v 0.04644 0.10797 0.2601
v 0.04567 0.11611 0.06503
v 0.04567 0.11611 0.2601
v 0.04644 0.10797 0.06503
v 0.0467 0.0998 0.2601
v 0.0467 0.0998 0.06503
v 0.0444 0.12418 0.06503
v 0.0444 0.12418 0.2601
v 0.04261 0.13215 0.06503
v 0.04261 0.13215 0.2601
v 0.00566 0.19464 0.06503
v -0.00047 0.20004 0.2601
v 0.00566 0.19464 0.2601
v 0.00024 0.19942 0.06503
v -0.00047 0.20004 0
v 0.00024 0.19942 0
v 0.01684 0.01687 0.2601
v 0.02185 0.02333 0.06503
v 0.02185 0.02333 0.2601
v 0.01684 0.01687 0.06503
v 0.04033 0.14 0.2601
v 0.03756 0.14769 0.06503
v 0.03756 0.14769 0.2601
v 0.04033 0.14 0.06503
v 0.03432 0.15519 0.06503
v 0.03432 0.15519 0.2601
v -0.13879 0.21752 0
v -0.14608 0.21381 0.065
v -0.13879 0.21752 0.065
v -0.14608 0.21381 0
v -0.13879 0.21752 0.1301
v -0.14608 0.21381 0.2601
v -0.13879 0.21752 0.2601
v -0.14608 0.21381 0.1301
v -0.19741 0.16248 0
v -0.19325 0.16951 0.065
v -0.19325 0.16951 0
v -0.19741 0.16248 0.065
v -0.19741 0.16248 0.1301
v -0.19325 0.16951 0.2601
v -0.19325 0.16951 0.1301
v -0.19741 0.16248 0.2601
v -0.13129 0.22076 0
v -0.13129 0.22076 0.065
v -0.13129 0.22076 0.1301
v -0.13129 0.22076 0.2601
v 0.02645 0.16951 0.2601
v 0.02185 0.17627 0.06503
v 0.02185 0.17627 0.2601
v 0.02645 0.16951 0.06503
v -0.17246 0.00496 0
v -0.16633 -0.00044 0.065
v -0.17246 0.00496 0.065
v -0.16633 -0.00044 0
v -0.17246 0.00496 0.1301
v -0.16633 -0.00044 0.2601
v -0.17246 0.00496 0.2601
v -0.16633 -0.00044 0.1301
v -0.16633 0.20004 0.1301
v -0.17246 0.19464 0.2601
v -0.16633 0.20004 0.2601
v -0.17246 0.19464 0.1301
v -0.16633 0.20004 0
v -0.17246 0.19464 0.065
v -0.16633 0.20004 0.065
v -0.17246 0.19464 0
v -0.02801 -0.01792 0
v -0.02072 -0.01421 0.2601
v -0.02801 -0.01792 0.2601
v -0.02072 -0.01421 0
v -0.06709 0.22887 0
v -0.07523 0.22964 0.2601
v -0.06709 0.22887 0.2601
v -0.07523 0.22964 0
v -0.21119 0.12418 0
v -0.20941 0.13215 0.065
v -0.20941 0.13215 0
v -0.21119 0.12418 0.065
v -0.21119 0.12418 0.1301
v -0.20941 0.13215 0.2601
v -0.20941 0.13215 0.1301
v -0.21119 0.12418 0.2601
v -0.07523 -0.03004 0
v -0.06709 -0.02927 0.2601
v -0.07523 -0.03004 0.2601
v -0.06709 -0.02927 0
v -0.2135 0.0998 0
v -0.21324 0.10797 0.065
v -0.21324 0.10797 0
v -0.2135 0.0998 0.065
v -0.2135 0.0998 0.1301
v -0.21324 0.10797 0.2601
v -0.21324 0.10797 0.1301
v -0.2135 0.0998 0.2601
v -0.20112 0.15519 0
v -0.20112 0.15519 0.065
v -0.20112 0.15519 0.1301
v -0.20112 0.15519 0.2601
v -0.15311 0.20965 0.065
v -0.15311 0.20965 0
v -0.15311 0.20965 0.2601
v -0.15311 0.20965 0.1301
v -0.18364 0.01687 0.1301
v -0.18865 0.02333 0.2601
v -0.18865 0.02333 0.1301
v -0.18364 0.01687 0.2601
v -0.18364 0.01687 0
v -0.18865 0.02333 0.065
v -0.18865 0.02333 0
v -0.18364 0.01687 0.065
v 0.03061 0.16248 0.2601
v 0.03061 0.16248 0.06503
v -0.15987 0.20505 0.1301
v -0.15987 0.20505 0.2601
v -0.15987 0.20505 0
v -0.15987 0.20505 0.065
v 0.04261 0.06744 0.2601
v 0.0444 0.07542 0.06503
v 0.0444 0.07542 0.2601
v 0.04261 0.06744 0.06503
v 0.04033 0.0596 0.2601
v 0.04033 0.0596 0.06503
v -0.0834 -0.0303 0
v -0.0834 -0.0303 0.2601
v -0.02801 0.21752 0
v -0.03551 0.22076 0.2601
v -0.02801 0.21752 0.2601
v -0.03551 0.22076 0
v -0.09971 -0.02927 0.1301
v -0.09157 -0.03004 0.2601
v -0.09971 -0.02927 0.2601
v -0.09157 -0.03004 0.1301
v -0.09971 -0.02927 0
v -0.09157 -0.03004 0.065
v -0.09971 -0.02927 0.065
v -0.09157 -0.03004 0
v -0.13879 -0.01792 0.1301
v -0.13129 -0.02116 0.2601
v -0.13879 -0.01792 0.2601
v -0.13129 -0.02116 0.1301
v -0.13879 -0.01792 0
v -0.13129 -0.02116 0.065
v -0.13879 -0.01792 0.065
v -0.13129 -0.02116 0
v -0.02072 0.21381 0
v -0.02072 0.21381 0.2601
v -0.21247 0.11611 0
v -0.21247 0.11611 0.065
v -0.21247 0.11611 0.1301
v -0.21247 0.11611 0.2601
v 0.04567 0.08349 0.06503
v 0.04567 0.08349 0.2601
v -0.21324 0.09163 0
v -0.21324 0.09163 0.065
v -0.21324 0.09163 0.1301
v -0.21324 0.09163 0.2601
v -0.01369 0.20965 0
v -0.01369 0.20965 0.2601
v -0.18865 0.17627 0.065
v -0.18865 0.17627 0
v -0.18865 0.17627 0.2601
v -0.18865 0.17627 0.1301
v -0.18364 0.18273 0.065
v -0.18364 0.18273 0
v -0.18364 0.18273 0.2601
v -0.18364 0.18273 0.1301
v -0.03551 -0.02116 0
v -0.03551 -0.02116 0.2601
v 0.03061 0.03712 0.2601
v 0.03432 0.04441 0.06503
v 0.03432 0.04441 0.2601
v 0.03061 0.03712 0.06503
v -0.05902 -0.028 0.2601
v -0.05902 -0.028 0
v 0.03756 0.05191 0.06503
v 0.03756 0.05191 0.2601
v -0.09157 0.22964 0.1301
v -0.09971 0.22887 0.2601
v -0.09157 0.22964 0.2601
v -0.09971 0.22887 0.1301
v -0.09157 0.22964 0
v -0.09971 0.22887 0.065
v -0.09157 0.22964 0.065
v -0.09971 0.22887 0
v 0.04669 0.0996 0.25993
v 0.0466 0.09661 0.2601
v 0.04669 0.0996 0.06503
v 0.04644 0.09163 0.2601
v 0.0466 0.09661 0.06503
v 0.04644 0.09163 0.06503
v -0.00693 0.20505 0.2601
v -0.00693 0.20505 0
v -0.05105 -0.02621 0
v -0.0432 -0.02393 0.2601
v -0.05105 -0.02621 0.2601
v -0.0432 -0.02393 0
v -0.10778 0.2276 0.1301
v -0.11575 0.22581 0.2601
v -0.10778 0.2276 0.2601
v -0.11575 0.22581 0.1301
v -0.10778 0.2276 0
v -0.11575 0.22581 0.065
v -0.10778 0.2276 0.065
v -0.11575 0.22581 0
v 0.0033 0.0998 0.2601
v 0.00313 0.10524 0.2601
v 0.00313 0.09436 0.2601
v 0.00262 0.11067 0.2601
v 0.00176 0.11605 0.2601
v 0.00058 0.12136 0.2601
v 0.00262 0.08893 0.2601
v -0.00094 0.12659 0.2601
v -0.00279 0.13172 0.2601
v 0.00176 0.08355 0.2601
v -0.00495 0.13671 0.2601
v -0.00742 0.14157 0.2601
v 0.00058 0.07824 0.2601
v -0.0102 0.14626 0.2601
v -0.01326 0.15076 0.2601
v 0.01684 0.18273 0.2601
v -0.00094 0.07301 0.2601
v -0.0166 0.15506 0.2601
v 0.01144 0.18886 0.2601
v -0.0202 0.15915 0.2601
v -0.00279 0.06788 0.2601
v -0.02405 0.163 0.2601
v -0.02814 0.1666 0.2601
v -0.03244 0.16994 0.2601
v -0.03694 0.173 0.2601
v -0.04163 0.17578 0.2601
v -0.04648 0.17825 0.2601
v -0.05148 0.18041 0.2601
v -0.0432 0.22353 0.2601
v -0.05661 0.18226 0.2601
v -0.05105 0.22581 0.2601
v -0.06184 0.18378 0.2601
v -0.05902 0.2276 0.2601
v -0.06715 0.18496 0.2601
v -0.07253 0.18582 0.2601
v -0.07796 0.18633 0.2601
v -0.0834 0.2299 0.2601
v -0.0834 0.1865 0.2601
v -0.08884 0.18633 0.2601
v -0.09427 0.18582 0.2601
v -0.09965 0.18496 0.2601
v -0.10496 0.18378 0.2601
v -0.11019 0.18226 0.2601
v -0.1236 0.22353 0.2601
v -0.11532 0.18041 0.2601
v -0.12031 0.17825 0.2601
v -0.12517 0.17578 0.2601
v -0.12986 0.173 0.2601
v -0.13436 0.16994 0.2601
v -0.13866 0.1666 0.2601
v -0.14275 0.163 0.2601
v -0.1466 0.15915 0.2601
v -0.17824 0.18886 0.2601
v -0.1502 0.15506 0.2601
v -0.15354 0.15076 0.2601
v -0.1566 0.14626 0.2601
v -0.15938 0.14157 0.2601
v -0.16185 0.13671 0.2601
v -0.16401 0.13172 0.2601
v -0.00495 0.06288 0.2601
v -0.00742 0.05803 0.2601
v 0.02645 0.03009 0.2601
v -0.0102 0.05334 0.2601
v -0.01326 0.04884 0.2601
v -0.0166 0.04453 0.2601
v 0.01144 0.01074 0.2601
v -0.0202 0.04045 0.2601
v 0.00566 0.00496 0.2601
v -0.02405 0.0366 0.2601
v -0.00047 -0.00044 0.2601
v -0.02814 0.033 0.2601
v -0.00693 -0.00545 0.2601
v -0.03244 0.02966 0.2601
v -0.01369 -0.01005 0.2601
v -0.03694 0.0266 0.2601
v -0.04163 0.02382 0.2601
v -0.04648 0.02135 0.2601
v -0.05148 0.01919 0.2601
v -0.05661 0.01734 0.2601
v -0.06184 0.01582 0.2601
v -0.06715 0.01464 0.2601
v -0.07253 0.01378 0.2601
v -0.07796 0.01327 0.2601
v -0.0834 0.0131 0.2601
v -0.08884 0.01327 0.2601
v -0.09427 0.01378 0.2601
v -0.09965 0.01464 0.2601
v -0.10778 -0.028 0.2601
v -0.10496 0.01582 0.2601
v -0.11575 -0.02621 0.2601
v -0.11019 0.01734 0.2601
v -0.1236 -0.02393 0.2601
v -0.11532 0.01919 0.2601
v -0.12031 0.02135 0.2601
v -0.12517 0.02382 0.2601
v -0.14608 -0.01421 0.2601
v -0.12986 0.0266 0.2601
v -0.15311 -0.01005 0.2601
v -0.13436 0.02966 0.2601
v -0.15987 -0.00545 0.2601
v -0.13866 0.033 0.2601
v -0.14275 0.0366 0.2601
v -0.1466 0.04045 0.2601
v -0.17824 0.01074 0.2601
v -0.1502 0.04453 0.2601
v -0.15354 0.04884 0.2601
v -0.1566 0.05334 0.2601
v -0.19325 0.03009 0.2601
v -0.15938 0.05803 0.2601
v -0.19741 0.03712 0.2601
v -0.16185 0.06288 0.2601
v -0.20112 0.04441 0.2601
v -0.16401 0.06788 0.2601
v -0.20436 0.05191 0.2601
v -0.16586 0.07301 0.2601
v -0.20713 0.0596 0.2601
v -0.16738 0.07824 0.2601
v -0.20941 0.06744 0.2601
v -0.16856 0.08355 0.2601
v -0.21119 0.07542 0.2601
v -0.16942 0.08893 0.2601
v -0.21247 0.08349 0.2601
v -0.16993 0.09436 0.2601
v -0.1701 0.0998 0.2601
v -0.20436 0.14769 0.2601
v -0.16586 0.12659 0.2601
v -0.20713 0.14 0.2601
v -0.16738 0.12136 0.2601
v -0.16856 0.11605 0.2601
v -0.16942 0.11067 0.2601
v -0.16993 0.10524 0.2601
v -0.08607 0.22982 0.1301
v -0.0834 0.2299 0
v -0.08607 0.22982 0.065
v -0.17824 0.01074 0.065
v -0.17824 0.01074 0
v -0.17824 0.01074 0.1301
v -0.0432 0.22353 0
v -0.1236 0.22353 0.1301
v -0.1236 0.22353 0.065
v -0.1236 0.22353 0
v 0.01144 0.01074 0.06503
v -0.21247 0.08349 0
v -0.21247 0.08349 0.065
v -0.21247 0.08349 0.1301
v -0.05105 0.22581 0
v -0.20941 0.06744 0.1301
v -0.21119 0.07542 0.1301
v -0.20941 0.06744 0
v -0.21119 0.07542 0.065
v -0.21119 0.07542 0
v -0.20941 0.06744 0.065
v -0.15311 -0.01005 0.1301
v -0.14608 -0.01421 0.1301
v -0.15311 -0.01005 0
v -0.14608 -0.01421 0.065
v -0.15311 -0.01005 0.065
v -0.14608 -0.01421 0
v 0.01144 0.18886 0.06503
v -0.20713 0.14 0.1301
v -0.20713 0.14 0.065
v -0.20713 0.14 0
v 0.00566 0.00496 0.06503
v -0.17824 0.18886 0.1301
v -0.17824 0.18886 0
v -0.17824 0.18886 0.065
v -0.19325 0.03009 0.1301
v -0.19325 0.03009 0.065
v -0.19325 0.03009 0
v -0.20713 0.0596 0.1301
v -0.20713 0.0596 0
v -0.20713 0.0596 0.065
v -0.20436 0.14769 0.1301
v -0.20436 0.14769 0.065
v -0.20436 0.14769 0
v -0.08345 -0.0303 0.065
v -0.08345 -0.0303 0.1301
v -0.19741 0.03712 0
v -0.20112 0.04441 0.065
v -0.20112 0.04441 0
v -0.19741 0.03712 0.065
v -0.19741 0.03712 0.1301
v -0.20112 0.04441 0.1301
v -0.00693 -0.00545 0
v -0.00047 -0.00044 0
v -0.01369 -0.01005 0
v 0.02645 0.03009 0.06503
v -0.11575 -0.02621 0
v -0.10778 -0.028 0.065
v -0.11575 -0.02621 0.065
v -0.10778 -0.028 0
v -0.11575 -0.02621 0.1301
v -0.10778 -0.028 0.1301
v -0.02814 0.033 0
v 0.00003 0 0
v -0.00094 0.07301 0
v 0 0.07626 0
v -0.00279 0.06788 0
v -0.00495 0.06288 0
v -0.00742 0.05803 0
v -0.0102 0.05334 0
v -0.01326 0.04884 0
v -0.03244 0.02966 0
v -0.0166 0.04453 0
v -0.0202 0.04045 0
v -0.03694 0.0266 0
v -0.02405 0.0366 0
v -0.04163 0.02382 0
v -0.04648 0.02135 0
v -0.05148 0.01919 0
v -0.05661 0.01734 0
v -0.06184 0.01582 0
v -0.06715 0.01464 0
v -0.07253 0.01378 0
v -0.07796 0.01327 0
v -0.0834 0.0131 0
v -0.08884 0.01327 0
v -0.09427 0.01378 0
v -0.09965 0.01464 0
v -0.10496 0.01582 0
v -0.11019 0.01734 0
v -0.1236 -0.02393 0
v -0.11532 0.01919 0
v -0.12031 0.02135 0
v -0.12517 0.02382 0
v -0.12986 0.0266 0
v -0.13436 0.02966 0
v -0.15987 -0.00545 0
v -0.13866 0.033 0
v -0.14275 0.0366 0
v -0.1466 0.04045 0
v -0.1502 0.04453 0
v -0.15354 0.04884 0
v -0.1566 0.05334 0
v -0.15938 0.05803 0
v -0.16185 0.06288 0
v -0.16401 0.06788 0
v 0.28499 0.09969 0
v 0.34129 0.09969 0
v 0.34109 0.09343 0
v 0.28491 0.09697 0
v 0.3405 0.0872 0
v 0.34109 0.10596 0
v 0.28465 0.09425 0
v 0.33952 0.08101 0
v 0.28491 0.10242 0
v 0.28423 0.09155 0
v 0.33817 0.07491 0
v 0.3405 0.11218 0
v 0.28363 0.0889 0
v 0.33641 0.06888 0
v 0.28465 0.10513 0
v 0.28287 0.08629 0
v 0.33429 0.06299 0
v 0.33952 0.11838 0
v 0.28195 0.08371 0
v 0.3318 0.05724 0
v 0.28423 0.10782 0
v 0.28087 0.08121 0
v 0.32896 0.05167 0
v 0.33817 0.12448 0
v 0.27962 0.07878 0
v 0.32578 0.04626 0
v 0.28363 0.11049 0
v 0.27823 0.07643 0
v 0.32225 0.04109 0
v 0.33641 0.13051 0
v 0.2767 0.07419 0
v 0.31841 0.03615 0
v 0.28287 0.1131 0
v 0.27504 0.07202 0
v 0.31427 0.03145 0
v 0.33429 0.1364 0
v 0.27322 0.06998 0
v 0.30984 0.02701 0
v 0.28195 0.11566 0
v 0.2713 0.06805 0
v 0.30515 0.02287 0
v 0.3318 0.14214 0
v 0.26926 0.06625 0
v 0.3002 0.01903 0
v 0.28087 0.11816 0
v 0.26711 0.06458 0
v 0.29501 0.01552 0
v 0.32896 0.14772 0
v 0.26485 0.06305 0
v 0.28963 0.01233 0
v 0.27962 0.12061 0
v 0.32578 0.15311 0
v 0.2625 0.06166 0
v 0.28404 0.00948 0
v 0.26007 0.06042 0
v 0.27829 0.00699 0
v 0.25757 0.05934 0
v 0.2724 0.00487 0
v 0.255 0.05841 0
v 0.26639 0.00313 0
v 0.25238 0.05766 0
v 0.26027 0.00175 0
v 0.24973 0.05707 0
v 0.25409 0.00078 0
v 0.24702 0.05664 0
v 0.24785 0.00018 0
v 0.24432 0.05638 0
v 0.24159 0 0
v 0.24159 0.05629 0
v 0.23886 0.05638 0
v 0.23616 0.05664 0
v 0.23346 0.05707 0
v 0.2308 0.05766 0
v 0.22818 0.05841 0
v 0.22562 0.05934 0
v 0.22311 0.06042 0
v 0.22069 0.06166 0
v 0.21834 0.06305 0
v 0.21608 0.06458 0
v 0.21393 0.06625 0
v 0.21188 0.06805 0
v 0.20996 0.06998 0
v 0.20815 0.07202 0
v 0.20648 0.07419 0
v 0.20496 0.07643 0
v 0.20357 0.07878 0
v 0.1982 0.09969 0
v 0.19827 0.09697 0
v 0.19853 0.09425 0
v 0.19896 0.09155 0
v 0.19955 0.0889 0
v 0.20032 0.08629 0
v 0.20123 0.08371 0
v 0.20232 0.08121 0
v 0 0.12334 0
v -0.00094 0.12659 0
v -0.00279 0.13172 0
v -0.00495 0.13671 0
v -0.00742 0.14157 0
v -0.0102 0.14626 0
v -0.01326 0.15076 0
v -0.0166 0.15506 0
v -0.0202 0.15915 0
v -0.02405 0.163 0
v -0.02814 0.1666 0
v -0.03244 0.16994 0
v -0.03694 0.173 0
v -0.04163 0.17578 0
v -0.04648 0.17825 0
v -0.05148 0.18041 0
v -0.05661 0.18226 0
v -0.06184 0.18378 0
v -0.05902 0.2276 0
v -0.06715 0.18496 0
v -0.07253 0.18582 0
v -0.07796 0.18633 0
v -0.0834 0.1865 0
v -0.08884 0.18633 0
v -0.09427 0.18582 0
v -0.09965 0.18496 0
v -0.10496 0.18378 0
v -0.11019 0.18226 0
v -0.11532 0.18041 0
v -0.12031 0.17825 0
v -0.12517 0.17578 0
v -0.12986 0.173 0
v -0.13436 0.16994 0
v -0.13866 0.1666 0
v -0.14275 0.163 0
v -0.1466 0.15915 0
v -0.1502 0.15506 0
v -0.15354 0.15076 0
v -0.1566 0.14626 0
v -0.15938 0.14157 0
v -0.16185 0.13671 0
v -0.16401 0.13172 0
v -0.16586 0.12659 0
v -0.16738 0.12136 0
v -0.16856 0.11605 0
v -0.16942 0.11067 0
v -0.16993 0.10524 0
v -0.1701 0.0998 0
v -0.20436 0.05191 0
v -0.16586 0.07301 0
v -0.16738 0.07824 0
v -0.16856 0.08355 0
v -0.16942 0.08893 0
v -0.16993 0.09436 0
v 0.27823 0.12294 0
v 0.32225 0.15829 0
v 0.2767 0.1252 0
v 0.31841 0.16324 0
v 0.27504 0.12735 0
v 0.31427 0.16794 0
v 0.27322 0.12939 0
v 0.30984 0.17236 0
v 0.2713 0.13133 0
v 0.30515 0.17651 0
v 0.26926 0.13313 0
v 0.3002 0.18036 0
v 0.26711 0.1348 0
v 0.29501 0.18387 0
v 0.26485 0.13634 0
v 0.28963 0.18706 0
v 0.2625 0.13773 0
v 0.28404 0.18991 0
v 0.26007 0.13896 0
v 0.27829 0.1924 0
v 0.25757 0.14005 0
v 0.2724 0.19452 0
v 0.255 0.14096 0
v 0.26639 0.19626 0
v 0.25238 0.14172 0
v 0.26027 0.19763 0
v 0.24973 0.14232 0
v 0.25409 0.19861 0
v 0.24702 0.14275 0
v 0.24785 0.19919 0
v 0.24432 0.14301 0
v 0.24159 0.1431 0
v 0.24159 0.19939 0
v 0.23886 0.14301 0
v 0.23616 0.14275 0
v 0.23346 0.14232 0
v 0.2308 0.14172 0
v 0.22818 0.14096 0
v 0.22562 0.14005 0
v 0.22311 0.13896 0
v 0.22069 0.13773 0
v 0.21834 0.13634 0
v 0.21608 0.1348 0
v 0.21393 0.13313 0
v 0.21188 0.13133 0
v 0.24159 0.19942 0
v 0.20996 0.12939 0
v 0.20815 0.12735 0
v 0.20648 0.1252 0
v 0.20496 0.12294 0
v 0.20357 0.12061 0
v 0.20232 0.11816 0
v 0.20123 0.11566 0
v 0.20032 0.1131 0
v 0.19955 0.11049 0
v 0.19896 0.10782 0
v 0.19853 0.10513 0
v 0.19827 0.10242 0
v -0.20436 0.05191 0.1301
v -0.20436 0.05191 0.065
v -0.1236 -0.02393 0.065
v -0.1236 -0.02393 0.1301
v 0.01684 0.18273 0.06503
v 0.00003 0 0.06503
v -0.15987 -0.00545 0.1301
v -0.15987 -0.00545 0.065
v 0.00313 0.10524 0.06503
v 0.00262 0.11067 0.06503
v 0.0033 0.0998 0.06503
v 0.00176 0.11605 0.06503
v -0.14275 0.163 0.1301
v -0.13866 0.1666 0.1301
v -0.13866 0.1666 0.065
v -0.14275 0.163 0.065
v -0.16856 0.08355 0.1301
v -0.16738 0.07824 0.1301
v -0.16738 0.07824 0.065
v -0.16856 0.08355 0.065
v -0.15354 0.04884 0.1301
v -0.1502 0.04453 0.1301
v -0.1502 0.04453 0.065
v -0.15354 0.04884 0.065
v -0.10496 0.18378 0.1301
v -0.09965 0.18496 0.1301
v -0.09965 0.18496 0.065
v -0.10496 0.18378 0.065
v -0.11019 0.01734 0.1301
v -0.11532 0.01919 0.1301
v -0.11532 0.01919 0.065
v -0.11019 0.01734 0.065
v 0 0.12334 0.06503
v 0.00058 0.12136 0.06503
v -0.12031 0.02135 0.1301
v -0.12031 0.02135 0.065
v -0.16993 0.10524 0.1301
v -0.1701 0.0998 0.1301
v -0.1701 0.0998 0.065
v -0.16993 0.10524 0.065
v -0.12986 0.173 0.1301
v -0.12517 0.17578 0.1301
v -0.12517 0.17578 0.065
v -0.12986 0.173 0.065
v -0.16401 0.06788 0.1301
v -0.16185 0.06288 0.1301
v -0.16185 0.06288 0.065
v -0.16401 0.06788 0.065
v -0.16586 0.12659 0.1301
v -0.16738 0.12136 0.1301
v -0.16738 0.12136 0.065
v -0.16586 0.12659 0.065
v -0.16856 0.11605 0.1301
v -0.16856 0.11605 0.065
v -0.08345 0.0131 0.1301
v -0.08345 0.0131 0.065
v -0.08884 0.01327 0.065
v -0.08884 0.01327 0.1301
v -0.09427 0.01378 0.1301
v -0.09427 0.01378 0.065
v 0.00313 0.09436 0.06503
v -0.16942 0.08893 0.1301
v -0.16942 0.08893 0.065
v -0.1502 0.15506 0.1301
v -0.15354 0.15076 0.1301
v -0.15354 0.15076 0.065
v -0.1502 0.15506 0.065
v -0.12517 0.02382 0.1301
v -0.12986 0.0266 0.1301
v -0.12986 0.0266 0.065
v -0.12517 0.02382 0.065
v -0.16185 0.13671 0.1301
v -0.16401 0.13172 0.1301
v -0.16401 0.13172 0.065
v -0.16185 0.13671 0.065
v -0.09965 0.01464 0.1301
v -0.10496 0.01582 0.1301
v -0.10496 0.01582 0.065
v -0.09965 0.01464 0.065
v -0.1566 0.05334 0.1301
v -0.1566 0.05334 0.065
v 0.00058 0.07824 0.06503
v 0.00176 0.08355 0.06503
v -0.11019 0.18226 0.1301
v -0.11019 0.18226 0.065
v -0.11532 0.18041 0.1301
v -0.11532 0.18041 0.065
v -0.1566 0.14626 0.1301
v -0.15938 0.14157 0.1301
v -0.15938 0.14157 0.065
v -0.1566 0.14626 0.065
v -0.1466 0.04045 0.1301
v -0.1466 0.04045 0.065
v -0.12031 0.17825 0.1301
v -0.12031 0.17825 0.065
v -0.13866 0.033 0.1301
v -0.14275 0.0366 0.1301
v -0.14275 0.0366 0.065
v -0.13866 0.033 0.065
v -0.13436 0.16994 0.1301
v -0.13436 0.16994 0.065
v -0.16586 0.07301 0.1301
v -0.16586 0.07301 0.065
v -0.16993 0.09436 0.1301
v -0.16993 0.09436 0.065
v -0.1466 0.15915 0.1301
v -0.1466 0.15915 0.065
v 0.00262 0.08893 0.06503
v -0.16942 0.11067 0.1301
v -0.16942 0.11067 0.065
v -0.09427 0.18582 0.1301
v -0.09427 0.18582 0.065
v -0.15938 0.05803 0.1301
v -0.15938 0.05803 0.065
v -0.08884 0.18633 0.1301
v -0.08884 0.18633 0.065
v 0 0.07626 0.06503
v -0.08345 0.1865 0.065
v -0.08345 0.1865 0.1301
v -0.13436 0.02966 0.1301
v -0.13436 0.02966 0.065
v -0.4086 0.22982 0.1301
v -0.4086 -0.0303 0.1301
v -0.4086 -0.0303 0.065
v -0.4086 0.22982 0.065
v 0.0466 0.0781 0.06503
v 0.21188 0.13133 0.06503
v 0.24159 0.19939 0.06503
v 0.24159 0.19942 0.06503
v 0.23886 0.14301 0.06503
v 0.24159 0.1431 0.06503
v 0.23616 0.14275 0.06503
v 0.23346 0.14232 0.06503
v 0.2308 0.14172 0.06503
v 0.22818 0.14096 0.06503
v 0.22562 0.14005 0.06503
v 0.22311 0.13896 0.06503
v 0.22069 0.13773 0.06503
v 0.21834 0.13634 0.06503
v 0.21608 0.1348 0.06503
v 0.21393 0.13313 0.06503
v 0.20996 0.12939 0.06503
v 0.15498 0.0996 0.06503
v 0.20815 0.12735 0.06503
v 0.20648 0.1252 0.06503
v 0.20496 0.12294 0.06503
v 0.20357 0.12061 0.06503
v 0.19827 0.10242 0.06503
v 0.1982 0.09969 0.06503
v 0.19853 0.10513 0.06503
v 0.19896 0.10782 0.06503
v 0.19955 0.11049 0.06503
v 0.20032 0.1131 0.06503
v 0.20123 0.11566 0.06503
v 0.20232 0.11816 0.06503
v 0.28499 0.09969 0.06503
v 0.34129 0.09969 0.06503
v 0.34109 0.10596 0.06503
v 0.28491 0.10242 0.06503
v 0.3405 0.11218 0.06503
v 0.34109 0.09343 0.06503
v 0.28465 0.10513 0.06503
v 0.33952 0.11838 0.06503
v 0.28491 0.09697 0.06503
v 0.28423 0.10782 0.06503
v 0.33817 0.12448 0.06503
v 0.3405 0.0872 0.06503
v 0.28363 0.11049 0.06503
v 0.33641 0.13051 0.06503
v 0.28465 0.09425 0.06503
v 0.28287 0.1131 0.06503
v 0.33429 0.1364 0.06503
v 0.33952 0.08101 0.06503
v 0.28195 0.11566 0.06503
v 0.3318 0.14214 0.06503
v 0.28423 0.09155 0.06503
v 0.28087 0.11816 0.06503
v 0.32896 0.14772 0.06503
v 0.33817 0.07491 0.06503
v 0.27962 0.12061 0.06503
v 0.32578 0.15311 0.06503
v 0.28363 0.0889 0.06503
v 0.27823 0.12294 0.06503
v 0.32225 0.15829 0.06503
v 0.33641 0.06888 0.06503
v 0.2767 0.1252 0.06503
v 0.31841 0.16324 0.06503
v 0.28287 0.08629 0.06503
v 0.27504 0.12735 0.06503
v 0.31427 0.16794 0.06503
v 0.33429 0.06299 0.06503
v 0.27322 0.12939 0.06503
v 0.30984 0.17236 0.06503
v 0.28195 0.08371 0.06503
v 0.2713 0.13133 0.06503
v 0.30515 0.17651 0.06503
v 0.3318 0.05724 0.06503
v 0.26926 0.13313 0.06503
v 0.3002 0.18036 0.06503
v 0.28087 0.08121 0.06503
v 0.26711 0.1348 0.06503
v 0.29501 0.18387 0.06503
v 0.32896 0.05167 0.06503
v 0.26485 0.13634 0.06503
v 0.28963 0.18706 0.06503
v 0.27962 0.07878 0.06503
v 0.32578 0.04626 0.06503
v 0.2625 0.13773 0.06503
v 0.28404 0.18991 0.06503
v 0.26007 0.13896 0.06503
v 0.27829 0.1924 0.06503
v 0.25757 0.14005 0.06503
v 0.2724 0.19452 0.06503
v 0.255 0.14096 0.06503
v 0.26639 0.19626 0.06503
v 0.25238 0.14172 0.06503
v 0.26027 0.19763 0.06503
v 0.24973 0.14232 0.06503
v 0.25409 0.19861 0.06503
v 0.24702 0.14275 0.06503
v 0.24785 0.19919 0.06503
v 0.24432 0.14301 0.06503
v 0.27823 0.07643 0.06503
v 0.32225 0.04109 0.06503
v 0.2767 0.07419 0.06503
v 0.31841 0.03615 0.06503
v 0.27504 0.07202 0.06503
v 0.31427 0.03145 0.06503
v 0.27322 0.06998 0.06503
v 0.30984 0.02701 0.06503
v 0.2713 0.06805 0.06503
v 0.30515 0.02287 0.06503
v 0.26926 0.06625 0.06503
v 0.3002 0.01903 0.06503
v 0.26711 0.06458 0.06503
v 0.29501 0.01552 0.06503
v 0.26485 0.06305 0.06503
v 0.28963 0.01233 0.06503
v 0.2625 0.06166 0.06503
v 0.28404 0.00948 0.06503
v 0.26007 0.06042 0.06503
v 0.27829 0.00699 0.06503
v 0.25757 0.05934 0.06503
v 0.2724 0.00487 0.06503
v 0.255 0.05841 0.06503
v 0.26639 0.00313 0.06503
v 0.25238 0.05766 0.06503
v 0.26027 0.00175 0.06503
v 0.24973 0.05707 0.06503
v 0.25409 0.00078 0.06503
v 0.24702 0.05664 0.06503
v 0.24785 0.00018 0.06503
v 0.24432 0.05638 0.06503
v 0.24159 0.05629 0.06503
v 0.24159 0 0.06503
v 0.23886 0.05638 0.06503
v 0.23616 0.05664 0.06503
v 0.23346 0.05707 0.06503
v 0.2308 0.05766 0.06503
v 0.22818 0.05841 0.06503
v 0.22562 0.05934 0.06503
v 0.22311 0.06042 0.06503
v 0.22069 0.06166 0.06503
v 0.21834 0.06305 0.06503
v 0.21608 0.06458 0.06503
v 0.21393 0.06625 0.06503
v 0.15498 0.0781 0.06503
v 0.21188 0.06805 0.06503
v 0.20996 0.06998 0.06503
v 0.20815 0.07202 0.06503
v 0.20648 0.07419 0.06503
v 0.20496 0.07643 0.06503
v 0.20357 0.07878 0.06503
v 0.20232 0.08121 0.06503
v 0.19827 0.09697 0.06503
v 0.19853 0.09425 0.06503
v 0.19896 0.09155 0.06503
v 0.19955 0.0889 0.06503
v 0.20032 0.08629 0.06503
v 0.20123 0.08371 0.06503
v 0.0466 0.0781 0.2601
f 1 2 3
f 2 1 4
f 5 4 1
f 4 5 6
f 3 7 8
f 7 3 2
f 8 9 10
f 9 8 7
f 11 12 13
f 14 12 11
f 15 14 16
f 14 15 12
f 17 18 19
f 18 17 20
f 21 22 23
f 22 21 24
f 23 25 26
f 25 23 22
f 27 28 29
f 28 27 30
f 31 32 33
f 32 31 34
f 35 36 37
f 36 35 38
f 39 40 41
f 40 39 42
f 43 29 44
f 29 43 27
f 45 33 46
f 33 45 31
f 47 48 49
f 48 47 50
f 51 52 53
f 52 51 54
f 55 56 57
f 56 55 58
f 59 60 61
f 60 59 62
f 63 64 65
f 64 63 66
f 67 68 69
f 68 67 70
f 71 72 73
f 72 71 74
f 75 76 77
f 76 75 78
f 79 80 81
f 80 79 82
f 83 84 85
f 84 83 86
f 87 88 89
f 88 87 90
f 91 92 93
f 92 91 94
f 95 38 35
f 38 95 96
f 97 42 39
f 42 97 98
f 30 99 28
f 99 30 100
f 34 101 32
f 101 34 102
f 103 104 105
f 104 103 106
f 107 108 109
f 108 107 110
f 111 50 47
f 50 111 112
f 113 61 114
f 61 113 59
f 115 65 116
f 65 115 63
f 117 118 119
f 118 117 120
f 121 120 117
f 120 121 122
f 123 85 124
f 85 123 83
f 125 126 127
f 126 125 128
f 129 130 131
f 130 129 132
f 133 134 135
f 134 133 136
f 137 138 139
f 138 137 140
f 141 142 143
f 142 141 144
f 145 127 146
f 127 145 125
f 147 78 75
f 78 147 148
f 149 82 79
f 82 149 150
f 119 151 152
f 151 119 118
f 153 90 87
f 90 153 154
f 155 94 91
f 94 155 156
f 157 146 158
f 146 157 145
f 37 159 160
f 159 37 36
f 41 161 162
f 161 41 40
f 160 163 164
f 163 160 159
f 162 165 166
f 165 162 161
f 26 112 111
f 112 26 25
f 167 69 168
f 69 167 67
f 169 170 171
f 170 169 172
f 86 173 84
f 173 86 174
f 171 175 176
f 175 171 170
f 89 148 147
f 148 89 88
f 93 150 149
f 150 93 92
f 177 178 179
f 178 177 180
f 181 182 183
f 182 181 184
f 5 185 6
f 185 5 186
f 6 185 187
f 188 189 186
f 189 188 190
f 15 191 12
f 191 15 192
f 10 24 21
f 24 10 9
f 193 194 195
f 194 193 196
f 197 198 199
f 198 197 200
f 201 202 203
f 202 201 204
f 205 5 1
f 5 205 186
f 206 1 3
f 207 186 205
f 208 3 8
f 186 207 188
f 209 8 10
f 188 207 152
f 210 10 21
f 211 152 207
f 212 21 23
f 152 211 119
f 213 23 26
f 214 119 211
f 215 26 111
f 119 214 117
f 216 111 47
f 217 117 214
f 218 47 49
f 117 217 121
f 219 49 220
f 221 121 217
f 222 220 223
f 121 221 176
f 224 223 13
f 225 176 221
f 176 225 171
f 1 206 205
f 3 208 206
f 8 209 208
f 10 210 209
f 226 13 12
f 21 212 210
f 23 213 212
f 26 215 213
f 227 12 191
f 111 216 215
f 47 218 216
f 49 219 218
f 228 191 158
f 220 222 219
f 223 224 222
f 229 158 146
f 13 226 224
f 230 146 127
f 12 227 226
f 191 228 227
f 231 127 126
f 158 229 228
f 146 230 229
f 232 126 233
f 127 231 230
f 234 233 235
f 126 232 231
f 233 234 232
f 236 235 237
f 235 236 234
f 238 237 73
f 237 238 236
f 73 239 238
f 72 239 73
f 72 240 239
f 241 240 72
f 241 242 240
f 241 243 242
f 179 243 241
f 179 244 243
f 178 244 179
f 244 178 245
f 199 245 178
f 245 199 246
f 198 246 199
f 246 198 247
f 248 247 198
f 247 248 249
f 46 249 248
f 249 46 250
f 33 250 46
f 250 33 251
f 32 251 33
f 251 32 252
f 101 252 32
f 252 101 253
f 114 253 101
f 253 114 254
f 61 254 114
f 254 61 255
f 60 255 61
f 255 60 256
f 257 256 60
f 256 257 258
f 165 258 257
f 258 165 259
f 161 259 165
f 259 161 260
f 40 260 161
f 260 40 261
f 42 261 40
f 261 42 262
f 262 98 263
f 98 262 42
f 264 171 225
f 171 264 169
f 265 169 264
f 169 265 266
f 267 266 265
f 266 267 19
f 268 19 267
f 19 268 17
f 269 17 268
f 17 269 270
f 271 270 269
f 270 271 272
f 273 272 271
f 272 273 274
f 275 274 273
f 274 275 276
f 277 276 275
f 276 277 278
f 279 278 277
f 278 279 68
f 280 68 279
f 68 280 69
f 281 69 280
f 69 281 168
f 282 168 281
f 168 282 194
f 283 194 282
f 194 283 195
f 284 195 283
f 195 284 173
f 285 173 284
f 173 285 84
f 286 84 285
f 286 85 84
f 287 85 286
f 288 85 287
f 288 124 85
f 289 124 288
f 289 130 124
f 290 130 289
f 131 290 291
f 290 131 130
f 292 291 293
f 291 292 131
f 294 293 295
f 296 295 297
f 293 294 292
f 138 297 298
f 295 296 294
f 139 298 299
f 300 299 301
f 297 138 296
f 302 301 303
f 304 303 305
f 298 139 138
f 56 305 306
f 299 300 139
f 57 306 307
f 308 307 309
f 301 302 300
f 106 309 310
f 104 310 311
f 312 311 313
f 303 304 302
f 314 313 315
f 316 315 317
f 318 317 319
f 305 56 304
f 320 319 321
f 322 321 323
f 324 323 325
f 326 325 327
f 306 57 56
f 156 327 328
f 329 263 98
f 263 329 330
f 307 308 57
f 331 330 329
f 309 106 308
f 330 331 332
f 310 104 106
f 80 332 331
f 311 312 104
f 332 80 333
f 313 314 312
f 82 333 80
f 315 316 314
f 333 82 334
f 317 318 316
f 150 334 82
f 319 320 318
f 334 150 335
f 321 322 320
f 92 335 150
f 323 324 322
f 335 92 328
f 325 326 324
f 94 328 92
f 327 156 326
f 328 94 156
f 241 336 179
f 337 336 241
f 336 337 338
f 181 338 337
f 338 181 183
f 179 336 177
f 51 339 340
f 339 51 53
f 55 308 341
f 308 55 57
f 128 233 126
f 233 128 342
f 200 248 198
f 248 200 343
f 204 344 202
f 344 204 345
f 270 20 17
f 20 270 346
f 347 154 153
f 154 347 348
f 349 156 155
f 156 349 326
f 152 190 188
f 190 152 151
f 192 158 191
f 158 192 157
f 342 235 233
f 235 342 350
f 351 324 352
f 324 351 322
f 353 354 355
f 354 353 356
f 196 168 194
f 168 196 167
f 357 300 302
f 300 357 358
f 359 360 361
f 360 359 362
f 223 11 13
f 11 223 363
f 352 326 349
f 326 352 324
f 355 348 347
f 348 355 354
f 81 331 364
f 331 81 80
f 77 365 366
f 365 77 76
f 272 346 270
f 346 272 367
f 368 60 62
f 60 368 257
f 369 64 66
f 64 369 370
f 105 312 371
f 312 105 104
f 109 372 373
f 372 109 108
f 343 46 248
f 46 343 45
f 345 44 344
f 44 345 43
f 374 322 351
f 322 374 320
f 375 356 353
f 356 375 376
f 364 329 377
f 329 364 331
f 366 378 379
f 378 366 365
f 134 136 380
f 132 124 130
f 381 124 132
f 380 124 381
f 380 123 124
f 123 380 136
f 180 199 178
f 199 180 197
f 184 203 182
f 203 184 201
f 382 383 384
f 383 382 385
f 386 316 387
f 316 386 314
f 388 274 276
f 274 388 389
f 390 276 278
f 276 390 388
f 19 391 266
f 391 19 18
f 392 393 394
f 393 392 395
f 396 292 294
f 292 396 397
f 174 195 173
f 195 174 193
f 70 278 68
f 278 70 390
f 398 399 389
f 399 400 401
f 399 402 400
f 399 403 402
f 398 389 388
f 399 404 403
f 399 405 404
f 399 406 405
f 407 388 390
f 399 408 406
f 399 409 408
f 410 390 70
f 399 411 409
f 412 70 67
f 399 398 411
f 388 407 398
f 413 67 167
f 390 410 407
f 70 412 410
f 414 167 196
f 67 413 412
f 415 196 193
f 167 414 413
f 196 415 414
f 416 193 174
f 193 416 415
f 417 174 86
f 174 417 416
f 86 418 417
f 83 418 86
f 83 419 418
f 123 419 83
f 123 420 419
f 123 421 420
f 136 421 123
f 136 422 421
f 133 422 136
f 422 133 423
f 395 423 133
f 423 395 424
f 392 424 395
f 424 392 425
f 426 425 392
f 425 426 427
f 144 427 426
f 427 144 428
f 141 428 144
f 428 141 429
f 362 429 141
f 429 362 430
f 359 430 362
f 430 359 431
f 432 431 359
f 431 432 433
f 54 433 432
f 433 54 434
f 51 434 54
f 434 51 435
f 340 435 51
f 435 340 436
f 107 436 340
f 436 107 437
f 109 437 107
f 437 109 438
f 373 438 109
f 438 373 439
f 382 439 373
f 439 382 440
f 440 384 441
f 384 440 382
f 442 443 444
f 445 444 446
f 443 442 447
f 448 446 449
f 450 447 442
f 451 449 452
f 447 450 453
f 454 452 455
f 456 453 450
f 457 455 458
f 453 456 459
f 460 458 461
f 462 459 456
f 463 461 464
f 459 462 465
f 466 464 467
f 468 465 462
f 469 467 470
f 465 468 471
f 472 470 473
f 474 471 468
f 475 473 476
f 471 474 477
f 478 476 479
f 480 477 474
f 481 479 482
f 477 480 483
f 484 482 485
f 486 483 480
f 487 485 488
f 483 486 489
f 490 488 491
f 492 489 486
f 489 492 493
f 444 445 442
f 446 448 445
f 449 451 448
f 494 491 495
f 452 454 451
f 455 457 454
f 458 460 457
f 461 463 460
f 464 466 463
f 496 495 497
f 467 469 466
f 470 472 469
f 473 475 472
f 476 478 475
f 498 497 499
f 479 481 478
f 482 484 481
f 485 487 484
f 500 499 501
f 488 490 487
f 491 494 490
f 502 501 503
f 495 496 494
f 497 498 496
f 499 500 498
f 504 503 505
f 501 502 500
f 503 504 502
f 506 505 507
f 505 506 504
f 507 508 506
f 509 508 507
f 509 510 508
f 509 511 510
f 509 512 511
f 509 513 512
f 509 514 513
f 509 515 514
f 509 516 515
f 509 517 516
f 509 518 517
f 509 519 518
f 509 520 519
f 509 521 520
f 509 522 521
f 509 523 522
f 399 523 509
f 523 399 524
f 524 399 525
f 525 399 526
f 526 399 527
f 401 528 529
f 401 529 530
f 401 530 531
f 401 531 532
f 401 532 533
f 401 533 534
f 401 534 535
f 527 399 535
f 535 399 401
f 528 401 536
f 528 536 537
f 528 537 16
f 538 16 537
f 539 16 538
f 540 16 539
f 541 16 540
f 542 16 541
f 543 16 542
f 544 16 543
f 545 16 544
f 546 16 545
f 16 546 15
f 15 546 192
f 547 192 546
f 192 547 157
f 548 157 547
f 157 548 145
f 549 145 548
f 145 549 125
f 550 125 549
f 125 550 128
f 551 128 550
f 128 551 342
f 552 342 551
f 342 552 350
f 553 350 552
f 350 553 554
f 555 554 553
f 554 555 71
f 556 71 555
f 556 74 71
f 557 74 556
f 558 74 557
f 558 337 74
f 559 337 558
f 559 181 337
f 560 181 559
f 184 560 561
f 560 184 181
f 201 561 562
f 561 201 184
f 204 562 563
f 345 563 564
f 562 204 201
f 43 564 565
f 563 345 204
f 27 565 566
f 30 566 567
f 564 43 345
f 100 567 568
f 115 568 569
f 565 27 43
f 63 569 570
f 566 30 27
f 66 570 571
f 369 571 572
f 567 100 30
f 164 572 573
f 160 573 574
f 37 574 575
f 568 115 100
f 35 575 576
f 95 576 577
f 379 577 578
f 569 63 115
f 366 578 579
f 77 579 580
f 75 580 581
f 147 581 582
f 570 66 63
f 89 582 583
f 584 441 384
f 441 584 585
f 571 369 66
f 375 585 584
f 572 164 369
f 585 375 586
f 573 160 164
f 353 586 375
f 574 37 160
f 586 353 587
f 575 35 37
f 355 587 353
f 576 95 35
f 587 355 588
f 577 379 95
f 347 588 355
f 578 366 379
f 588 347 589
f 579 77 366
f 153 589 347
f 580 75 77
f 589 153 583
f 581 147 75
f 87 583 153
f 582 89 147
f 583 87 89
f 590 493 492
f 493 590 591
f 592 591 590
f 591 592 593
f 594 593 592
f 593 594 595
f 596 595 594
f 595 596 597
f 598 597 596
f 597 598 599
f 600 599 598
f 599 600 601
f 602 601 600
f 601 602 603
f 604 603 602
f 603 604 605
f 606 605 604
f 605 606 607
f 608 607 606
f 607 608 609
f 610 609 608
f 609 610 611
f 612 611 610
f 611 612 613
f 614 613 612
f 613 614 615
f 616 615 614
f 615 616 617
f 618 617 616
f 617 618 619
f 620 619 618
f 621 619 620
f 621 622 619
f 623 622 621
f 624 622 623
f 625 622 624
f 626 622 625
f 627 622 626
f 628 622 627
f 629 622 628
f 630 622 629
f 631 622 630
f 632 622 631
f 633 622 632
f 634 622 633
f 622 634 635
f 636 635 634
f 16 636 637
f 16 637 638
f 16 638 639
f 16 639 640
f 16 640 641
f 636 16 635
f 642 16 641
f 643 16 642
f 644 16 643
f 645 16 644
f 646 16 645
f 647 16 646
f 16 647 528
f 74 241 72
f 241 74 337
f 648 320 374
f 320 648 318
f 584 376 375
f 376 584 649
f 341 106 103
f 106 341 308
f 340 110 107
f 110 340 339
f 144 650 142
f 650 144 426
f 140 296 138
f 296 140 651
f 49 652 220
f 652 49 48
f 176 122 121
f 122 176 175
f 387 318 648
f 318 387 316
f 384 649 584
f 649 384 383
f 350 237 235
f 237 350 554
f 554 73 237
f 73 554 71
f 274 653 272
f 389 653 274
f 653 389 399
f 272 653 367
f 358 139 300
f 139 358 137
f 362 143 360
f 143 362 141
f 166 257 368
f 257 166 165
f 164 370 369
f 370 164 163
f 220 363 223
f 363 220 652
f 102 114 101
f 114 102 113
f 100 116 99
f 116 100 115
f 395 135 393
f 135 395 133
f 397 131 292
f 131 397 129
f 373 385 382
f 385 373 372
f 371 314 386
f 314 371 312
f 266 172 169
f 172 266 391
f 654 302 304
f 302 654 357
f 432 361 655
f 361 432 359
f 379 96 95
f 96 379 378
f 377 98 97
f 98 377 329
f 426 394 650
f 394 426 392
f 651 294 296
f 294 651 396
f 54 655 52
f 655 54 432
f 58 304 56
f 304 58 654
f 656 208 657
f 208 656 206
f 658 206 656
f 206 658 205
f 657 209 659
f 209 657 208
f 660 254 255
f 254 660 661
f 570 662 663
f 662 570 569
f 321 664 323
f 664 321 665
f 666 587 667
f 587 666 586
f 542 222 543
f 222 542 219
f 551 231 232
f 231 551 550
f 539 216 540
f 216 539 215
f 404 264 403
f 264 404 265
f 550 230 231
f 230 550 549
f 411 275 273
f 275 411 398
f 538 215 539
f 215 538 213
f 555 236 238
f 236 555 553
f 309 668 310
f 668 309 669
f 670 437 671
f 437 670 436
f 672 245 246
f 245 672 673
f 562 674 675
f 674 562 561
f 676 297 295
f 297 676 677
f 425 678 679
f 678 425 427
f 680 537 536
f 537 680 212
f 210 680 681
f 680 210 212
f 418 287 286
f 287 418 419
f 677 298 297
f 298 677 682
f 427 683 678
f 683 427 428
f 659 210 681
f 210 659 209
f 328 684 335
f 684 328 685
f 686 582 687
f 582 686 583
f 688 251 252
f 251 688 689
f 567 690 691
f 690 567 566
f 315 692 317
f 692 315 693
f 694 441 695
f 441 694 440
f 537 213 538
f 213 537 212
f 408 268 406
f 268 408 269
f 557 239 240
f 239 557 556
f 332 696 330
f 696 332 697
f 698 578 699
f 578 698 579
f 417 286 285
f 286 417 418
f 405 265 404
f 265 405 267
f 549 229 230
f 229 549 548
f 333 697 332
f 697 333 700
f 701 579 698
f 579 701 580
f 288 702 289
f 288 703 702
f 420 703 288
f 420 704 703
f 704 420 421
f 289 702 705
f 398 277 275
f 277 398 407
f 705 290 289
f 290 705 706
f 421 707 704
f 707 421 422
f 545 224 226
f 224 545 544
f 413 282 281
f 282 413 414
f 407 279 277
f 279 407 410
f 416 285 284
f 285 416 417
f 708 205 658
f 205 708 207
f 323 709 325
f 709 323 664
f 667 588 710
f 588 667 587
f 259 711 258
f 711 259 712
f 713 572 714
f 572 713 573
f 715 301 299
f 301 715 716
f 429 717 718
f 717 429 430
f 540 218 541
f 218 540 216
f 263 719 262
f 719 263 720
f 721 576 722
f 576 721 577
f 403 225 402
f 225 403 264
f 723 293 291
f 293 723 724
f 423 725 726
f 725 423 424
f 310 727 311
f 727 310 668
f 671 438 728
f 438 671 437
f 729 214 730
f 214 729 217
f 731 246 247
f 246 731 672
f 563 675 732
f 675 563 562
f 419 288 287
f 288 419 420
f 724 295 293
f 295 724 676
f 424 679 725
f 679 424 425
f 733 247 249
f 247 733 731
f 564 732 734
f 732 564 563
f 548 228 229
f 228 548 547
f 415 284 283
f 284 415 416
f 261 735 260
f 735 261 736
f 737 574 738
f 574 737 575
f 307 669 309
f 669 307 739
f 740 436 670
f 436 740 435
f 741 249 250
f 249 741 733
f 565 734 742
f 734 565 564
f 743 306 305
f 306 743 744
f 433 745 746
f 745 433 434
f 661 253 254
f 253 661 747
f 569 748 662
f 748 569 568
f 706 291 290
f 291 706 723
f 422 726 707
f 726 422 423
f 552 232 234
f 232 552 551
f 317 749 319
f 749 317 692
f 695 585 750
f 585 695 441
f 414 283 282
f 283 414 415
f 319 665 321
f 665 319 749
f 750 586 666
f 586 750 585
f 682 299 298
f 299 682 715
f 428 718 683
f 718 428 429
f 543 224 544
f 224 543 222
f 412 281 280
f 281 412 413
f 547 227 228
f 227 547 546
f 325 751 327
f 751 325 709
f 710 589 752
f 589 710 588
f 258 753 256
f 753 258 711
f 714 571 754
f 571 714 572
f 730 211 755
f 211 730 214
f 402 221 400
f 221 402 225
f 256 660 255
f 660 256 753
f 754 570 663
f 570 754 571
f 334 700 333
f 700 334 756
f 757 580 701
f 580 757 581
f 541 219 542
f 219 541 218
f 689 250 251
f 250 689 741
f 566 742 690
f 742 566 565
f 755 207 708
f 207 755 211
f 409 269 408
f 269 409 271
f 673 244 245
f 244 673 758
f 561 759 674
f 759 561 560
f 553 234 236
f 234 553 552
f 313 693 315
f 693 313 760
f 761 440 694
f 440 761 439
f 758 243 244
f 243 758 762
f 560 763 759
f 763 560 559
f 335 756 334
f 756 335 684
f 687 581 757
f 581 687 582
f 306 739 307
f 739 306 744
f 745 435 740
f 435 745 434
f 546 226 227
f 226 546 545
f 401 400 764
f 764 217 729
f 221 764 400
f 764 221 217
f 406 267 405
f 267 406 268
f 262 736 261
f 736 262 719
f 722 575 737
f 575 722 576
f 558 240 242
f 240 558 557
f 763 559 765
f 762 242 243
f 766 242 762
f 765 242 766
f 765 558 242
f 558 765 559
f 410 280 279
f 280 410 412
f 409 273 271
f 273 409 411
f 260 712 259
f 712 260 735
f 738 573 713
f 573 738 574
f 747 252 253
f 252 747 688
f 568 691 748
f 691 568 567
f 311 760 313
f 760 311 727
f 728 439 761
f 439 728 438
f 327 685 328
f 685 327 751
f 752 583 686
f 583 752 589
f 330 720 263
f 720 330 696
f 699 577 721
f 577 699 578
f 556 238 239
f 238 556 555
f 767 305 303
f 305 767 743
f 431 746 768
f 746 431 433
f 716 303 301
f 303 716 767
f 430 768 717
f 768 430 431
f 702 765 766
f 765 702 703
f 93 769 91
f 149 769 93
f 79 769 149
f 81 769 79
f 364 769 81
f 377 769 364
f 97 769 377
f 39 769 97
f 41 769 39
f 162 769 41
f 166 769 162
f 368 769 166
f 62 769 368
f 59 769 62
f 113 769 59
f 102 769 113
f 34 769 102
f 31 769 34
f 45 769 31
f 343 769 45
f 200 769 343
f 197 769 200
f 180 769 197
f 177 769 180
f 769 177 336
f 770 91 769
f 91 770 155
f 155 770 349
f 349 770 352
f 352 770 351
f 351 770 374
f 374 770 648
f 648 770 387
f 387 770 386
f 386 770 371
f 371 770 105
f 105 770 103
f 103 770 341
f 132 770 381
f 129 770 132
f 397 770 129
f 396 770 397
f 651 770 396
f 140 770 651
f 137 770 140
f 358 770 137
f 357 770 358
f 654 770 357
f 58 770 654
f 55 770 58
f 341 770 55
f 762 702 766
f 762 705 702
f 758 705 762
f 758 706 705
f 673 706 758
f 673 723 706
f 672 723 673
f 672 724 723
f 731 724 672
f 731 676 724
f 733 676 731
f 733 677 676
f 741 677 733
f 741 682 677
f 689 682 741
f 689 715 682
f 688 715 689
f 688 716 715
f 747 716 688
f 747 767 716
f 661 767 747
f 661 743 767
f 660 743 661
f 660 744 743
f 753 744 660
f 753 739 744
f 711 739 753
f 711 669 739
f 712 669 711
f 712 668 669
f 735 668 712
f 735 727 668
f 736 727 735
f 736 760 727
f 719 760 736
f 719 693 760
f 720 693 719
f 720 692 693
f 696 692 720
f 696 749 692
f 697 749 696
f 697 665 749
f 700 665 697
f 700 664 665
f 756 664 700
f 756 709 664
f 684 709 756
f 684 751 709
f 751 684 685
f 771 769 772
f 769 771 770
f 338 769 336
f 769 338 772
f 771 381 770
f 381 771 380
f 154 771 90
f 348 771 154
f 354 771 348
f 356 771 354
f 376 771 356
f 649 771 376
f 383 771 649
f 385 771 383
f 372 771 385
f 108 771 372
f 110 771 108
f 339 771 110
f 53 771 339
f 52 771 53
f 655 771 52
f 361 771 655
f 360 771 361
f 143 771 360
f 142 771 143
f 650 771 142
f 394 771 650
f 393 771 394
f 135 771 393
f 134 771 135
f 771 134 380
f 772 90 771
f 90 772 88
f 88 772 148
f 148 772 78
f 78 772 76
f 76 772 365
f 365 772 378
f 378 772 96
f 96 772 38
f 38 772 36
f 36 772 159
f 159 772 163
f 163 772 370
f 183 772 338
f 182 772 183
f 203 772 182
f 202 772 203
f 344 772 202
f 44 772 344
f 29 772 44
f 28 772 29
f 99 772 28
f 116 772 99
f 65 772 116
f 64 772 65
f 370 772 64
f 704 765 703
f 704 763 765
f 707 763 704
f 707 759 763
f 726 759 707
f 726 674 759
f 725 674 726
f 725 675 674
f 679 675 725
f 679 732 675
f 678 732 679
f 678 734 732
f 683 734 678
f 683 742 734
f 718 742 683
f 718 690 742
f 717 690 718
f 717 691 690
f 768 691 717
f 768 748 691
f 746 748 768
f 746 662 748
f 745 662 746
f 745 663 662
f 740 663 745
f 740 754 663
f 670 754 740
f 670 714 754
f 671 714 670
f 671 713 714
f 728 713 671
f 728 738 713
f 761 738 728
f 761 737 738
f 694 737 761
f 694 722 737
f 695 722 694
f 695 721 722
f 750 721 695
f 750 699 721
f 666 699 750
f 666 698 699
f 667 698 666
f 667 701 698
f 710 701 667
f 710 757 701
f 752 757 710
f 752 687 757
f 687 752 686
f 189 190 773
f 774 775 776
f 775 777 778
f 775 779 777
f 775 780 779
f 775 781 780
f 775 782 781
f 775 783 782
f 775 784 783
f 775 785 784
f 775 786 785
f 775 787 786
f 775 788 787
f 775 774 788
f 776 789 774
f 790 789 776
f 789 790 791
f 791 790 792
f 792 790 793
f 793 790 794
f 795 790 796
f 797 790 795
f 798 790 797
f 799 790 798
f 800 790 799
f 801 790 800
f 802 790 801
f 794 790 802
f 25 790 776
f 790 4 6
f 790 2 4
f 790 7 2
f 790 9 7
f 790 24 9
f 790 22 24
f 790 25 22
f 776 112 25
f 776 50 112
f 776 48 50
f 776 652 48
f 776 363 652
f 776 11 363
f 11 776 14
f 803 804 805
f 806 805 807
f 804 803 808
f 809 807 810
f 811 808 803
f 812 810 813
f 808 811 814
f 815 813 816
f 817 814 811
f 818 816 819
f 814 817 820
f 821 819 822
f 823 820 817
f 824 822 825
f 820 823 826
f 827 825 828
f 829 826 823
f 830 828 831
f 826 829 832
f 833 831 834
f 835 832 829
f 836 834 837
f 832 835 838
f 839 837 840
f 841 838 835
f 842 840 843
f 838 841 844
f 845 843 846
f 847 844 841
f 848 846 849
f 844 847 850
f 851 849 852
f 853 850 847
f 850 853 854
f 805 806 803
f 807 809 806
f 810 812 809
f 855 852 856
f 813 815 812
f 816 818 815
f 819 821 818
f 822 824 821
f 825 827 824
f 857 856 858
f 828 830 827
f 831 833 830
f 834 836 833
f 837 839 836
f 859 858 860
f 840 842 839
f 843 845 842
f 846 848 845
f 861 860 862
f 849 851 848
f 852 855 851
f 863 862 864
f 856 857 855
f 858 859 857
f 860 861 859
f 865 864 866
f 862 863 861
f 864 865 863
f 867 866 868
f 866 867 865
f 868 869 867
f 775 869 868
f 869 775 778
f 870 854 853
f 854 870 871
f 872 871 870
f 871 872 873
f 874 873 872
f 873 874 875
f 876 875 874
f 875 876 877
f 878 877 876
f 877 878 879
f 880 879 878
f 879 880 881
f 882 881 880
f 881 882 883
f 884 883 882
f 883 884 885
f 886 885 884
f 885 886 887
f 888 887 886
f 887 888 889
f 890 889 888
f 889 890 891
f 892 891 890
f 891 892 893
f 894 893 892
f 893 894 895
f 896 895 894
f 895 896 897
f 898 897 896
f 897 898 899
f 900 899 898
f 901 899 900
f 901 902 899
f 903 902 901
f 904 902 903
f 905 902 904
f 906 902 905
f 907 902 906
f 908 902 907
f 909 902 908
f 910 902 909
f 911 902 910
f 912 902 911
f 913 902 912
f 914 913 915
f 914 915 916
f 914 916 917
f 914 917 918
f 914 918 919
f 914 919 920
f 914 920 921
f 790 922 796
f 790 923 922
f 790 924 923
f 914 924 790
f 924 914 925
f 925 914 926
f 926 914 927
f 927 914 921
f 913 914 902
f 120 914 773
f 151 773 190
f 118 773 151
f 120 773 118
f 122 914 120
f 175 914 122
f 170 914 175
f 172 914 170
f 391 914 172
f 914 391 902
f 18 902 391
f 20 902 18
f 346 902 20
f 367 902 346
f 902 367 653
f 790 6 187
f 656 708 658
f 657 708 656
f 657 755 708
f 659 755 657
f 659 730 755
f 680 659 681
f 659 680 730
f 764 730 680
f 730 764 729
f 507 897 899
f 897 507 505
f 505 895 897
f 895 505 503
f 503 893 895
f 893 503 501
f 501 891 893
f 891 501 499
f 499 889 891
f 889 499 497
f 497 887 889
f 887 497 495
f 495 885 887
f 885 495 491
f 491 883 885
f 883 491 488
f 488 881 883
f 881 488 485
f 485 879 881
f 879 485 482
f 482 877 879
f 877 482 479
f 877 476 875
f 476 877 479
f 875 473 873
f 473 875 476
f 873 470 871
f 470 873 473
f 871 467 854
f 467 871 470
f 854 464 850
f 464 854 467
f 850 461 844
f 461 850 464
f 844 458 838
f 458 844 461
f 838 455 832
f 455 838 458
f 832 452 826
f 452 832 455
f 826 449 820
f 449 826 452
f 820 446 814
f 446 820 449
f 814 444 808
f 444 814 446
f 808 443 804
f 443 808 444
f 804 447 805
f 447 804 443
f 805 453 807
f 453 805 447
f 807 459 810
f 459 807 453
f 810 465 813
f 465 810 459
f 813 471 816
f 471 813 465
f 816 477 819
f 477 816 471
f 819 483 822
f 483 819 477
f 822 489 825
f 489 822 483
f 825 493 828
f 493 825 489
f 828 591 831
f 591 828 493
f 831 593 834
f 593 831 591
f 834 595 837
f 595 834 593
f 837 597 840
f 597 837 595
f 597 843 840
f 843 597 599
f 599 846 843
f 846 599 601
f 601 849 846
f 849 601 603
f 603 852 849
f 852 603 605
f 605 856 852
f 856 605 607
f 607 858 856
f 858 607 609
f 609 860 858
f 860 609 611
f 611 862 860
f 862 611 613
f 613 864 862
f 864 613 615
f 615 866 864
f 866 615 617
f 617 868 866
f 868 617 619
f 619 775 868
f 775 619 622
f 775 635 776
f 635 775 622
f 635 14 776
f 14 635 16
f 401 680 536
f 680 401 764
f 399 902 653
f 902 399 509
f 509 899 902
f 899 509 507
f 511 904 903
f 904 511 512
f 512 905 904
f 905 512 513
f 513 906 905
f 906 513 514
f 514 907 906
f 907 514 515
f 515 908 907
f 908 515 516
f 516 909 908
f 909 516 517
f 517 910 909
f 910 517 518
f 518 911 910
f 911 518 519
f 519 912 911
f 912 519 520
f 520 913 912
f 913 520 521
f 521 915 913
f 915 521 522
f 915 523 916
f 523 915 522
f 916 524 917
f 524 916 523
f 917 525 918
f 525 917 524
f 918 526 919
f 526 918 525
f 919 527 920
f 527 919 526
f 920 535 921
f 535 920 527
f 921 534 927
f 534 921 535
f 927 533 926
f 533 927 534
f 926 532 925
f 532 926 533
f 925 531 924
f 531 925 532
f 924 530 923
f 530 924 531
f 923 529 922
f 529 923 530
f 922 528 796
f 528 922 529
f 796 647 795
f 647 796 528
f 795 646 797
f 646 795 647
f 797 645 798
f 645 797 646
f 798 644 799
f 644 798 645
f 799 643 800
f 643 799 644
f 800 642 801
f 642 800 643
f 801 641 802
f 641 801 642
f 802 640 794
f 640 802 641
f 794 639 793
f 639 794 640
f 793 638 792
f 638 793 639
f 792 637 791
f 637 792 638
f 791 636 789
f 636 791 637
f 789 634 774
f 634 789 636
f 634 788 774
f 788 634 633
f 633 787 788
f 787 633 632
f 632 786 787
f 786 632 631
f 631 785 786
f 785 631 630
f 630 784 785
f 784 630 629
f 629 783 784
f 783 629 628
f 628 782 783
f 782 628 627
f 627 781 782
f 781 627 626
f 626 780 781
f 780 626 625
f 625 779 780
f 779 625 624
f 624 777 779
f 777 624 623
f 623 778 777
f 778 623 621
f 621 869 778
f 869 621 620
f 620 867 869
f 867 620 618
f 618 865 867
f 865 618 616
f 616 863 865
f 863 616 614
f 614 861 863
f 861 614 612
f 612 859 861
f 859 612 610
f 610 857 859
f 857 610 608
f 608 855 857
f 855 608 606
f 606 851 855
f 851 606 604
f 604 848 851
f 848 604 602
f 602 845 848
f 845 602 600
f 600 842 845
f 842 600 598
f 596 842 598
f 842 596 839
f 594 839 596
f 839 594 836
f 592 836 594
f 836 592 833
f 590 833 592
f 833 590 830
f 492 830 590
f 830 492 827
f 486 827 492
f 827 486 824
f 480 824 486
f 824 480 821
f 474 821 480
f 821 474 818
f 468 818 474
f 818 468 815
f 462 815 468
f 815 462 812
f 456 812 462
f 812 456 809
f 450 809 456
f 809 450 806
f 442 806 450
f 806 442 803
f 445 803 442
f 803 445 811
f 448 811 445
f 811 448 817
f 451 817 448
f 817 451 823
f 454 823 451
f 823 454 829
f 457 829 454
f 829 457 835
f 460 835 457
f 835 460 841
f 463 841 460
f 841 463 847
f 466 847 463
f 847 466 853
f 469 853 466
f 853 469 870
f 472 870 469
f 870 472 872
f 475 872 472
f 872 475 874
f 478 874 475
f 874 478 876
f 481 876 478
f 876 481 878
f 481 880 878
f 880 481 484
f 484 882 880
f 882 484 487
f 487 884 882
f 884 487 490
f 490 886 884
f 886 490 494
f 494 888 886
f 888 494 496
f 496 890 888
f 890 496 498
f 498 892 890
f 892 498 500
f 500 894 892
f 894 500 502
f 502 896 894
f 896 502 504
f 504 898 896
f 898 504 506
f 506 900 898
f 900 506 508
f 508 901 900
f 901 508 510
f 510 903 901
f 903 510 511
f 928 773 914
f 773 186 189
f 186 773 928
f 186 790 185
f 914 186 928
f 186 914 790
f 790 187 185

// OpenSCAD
// Global resolution setting for smooth curved surfaces
$fn = 100;

// --------------------------
// Parametric Model Definitions
// --------------------------
// Coordinate system: Origin at front-bottom-left corner of the main base
// X: Left-to-right, Y: Front-to-back, Z: Bottom-to-top (all dimensions in mm)

// Main base dimensions
base_length = 0.341352;    // Total X length of base
base_width = 0.199422;     // Total Y width of base
base_height = 0.065029;    // Total Z thickness of base
base_extrude = 0.065;      // Primary extrusion depth (matches base thickness)

// Low rounded annular section (integral to base right end)
annulus_cx = 0.2416;       // X center from left edge
annulus_cy = 0.0997;       // Y center from front edge
annulus_outer_r = 0.0997;  // Outer radius of annular ring
annulus_inner_r = 0.0434;  // Inner radius of through-hole

// Tall hollow overhanging sleeve
sleeve_cx = -0.0834;       // X center offset from base left edge
sleeve_cy = 0.0998;        // Y center offset from base front edge
sleeve_outer_r = 0.1301;   // Outer radius (matches 0.2602 span = 2*0.1301)
sleeve_inner_r = 0.0867;   // Inner radius for hollow bore
sleeve_height = 0.2601;    // Total height from base datum (Z=0 to Z=0.2601)

// Projecting straight-sided arm
arm_length = 0.325145;     // X dimension of arm
arm_width = 0.260116;      // Y dimension of arm
arm_total_height = 0.130058;// Full solid height before cut
arm_left_x = -0.4086;      // Left edge X (overhangs base left)
arm_front_y = -0.0303;     // Front edge Y (overhangs base front)
arm_cut_band_z = 0.065;    // Cut lower section from Z=0 to this height
arm_top_z = 0.1301;        // Final top surface height from base datum
// Calculated arm edges
arm_right_x = arm_left_x + arm_length;
arm_back_y = arm_front_y + arm_width;

// Triangular support gusset web
web_plan_run = 0.108382;   // Horizontal X run length from sleeve
web_thickness = 0.0217;    // Material thickness in Y direction
web_x_left = 0.0466;       // Left edge (adjacent to sleeve outer wall)
web_x_bound_right = 0.1863;// Right placement bound
web_y_front = 0.0781;      // Front edge Y
web_y_back = 0.0996;       // Back edge Y
web_rise = 0.195087;       // Vertical rise from base top to sleeve top
web_z_base = base_height;  // Z height at base top surface
web_z_sleeve = sleeve_height; // Z height at sleeve top surface
// Calculated web right edge
web_x_right = web_x_left + web_plan_run;

// --------------------------
// Reusable Component Modules
// --------------------------

// Main base with integrated rounded annular end and through-hole
module base() {
    linear_extrude(height=base_height) {
        difference() {
            union() {
                // Straight rectangular body section
                square([annulus_cx, base_width], center=false);
                // Rounded circular end forming outer profile of annulus
                translate([annulus_cx, annulus_cy])
                    circle(r=annulus_outer_r);
            }
            // Through-hole for annular section, cuts full base thickness
            translate([annulus_cx, annulus_cy])
                circle(r=annulus_inner_r);
        }
    }
}

// Tall hollow annular sleeve
module sleeve() {
    difference() {
        // Outer sleeve cylinder
        translate([sleeve_cx, sleeve_cy, 0])
            cylinder(h=sleeve_height, r=sleeve_outer_r, center=false);
        // Inner bore cut (oversized for clean manifold)
        translate([sleeve_cx, sleeve_cy, -0.1])
            cylinder(h=sleeve_height + 0.2, r=sleeve_inner_r, center=false);
    }
}

// Projecting stepped arm, cut to create raised tier
module arm() {
    difference() {
        // Full solid arm blank
        translate([arm_left_x, arm_front_y, 0])
            cube([arm_length, arm_width, arm_top_z], center=false);
        // Remove lower band to create the stepped tier
        translate([arm_left_x - 0.01, arm_front_y - 0.01, -0.1])
            cube([arm_length + 0.02, arm_width + 0.02, arm_cut_band_z + 0.1], center=false);
    }
}

// Triangular support gusset between sleeve and base top
module web() {
    x1 = web_x_left;
    x2 = web_x_right;
    y1 = web_y_front;
    y2 = web_y_back;
    z1 = web_z_base;
    z2 = web_z_sleeve;
    
    // Vertices for right-triangular prism geometry
    points = [
        [x1, y1, z1],  // 0: Left-front-bottom
        [x1, y2, z1],  // 1: Left-back-bottom
        [x1, y1, z2],  // 2: Left-front-top
        [x1, y2, z2],  // 3: Left-back-top
        [x2, y1, z1],  // 4: Right-front-bottom
        [x2, y2, z1]   // 5: Right-back-bottom
    ];
    
    // Face definitions (outward-facing winding order for manifold geometry)
    faces = [
        [0, 2, 4],     // Front triangular face
        [1, 5, 3],     // Back triangular face
        [0, 1, 3, 2],  // Left vertical face (mated to sleeve)
        [0, 4, 5, 1],  // Bottom horizontal face (mated to base)
        [2, 3, 5, 4]   // Sloped top face
    ];
    
    polyhedron(points=points, faces=faces, convexity=2);
}

// --------------------------
// Final Model Assembly
// --------------------------
union() {
    base();
    sleeve();
    arm();
    web();
}
